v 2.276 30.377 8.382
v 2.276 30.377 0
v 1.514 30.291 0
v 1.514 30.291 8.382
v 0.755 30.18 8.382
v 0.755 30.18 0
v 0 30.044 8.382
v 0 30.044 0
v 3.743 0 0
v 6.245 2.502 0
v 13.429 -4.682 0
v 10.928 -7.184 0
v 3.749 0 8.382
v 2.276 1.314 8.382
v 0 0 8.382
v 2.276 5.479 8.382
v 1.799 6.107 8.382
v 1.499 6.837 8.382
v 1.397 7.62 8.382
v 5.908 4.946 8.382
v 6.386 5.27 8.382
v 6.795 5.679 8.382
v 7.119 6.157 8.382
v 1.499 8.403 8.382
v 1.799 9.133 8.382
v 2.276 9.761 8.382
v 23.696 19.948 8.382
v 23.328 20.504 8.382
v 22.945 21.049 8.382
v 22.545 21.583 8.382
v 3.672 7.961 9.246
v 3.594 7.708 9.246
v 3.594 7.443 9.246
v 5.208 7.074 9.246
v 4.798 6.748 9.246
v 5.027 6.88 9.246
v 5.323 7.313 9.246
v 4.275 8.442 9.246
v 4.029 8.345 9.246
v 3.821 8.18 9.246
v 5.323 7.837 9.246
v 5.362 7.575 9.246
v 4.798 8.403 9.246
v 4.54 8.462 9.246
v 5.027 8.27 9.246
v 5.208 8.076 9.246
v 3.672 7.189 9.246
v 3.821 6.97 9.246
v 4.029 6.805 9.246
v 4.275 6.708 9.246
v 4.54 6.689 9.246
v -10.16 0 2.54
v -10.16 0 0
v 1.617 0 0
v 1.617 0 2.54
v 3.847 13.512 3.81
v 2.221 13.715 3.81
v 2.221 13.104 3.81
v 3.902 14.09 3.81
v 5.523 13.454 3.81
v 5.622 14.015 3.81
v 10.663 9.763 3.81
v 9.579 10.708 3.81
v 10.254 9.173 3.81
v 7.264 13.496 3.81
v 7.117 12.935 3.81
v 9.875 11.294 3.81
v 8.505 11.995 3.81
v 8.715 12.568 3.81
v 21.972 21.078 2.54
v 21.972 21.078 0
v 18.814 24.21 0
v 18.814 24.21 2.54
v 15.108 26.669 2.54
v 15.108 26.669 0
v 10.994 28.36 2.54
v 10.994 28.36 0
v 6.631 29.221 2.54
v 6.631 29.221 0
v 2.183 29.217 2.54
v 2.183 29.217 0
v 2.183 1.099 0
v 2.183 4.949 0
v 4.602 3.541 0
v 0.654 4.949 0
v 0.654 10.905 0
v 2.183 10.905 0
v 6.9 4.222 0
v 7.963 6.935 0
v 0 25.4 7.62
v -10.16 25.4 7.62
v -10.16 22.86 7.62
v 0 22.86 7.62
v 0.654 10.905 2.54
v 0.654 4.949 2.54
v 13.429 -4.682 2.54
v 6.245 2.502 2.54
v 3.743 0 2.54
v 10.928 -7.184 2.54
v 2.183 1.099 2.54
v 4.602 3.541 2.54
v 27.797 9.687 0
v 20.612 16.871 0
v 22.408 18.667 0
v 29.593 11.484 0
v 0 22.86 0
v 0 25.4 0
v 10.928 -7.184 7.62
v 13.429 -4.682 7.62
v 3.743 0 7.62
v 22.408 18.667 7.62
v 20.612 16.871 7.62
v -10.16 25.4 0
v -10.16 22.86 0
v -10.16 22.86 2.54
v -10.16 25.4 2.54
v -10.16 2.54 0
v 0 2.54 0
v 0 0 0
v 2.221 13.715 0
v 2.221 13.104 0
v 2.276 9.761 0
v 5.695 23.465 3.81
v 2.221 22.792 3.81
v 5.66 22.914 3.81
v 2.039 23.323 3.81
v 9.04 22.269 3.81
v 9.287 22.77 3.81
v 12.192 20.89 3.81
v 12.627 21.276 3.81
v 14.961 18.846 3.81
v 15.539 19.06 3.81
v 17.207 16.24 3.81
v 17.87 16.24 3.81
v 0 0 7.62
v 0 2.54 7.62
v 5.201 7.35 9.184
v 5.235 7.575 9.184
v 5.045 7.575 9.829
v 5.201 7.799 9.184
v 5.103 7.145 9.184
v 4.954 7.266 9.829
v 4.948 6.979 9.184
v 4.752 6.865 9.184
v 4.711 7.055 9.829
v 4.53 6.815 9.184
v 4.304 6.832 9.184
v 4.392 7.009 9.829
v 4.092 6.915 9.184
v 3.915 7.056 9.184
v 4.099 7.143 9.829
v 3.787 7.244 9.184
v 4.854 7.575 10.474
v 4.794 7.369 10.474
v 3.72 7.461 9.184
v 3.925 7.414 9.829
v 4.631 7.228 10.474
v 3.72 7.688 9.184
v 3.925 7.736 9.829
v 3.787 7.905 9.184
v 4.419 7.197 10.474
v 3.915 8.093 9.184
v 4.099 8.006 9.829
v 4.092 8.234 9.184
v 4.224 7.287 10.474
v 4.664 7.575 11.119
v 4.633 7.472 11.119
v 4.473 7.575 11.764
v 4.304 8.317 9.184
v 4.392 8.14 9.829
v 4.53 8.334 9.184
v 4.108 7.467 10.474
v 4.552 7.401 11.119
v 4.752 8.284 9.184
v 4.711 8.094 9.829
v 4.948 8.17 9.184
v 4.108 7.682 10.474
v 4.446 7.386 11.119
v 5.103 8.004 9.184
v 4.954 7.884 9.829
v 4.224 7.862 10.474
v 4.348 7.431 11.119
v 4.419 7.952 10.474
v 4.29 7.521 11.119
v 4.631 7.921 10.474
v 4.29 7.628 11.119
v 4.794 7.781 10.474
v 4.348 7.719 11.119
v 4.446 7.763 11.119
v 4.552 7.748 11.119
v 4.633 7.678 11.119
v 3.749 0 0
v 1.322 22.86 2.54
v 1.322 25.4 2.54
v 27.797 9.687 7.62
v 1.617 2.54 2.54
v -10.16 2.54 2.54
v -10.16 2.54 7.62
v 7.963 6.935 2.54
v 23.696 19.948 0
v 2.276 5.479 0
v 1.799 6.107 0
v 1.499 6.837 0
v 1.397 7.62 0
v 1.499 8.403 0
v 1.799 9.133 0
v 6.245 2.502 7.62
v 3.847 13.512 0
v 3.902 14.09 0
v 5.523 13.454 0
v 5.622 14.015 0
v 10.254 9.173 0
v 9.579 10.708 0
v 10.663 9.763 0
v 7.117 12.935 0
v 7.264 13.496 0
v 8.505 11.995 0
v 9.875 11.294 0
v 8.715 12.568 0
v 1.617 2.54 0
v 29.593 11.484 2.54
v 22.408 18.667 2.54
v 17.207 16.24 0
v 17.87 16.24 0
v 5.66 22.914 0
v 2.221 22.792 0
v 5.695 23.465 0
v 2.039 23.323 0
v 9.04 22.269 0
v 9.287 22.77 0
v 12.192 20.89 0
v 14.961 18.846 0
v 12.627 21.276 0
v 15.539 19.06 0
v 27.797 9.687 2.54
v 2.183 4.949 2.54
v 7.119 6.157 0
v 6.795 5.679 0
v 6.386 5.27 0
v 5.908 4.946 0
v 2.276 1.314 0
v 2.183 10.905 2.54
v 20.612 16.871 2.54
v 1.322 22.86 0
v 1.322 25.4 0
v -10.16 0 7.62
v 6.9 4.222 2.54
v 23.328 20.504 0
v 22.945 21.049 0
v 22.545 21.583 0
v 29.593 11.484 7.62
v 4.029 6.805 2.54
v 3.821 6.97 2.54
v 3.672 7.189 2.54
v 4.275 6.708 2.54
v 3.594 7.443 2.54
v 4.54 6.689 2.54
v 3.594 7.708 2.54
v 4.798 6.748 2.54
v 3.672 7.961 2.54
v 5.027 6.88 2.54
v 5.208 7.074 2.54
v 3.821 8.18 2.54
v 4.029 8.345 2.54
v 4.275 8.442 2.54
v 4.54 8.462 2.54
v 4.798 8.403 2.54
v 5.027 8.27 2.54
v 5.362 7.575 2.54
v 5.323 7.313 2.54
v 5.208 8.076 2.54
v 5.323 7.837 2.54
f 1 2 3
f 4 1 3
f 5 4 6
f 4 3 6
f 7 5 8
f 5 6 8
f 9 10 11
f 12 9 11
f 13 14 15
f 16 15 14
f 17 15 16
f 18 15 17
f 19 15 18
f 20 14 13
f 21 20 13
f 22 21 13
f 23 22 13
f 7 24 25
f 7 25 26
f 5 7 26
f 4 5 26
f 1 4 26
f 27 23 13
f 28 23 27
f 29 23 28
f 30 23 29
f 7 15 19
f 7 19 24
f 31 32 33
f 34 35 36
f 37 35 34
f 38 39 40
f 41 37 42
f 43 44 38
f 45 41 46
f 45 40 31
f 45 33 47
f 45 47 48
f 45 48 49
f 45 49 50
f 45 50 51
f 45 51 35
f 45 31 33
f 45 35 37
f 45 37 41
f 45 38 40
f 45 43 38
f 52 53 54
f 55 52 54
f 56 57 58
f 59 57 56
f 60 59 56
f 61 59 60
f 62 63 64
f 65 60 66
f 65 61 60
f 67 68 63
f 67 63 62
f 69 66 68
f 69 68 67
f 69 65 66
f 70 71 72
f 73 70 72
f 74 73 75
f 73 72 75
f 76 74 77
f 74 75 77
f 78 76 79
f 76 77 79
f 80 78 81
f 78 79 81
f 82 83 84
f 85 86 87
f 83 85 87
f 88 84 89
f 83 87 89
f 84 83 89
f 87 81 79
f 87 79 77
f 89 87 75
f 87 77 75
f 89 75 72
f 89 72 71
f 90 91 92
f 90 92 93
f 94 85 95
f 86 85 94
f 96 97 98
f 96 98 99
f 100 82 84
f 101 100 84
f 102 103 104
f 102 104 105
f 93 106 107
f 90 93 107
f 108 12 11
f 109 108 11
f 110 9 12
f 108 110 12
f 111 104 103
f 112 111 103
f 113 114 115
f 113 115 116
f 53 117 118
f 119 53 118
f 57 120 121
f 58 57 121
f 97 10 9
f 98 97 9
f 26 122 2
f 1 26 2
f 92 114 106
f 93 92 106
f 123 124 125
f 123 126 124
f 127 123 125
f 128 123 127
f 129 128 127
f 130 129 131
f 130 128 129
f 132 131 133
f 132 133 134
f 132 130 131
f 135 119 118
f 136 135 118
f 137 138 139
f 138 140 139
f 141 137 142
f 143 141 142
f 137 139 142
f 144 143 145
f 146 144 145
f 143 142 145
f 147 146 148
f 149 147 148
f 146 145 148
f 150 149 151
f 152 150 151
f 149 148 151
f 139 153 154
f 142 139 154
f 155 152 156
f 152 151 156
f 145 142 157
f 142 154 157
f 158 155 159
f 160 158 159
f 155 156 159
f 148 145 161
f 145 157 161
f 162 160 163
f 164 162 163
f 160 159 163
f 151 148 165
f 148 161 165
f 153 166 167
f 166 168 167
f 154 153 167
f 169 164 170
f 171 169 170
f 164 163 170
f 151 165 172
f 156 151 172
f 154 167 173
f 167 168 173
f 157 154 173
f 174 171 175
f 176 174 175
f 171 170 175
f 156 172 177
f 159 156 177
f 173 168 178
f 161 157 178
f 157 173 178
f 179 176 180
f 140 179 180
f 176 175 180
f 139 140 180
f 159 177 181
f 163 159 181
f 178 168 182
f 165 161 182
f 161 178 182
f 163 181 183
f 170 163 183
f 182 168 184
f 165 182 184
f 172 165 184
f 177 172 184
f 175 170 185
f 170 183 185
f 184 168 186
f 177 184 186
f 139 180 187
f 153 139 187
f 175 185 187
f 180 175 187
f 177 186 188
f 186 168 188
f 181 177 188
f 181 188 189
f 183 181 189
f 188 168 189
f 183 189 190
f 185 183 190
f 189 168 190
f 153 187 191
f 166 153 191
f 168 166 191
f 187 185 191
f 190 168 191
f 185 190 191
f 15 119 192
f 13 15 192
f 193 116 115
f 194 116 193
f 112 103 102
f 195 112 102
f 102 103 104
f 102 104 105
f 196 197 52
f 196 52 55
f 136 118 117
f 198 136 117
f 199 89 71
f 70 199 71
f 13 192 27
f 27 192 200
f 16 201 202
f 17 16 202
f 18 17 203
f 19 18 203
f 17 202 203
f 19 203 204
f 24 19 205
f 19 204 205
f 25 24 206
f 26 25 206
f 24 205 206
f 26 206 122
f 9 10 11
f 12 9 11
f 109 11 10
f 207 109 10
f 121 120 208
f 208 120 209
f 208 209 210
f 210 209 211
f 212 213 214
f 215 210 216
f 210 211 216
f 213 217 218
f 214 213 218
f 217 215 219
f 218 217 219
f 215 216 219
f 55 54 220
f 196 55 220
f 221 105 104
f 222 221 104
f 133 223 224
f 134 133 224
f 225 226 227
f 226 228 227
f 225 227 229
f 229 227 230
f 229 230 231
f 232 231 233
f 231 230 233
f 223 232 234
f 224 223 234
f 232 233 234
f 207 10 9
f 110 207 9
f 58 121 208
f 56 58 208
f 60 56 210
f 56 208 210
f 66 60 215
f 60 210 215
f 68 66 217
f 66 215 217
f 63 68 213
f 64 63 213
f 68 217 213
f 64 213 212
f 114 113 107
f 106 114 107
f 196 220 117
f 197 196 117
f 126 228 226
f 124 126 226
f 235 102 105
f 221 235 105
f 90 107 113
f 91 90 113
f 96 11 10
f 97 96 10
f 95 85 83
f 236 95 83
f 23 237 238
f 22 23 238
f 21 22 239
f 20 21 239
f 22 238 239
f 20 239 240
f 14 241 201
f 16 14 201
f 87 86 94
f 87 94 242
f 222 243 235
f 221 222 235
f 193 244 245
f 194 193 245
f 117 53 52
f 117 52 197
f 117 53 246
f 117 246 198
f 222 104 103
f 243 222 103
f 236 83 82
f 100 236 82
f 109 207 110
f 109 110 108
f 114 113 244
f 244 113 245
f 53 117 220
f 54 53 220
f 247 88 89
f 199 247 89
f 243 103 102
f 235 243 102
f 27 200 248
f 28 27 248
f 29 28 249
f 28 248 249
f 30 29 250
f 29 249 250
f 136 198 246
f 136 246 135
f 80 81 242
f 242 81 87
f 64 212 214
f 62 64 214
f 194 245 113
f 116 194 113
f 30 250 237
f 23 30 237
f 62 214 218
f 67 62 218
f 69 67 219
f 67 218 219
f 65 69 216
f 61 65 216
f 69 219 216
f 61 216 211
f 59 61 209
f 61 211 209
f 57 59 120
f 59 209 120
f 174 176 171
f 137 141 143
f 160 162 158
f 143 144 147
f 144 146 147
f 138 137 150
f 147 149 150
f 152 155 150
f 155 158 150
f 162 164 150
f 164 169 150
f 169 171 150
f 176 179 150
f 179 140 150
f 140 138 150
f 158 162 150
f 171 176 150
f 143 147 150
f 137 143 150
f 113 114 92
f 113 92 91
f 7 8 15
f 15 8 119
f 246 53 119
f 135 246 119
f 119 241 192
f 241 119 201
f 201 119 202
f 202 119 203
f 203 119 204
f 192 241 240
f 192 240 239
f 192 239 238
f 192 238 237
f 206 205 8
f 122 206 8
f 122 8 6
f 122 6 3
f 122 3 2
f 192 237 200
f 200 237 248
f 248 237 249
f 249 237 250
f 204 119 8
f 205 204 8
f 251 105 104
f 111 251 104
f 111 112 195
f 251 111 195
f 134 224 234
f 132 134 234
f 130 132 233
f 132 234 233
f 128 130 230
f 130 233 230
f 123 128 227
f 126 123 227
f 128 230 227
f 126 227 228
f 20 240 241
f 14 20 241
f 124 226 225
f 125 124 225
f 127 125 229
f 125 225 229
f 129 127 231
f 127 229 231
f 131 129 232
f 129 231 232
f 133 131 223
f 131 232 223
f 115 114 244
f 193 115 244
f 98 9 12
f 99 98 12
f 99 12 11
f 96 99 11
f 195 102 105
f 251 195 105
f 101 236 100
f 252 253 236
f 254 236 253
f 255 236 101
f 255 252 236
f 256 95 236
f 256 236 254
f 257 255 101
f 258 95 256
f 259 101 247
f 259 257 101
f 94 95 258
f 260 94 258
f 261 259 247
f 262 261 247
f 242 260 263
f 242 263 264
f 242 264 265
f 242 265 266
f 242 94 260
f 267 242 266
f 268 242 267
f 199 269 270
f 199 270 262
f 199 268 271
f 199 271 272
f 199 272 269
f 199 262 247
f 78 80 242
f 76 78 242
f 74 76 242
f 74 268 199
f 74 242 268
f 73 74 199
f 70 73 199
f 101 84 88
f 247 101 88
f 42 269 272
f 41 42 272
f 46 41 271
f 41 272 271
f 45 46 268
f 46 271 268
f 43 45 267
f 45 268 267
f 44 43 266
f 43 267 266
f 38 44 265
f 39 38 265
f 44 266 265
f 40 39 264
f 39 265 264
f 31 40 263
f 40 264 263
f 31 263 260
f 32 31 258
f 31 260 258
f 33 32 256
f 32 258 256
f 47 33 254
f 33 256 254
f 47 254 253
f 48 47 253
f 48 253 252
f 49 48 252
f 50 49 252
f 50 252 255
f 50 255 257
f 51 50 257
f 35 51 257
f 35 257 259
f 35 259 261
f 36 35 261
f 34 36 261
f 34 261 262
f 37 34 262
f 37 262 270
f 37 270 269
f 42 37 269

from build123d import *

# Parameters (mm, degrees)
F1_DEPTH  = 8.382
F3_DEPTH  = 2.54
F2_W      = 8.050916653
F2_H      = 2.54
F2_W_2    = 1.6165730776
F2_W_3    = 2.109083347
F2_W_4    = 8.7637735362
F2_W_5    = 1.3216704829
F2_W_6    = 1.3962264638
F2_W_7    = 1.5293723554
F2_H_2    = 5.9558576904
F4_R      = 0.889
F5_DEPTH  = 9.2456
F7_DEPTH  = 3.81
F11_DEPTH = 7.62


with BuildPart() as f1:
    # F0 (on Top) → F1 (new body)
    with BuildSketch(Plane.XY):
        with BuildLine():
            Line((3.7485493437, 0), (23.6961988577, 19.947649514))
            ThreePointArc((23.6961988577, 19.947649514), (23.1385430874, 20.7779271482), (22.5451034559, 21.583017399))
            Line((22.5451034559, 21.583017399), (7.1187551725, 6.1566691156))
            ThreePointArc((7.1187551725, 6.1566691156), (6.6002614691, 5.4647385309), (5.9083308844, 4.9462448275))
            Line((5.9083308844, 4.9462448275), (2.2759593506, 1.3138732936))
            Line((2.2759593506, 1.3138732936), (2.2759593506, 0))
            Line((2.2759593506, 0), (3.7485493437, 0))
        make_face()
        with BuildLine():
            ThreePointArc((2.2759593506, 30.3768640779), (1.1337863589, 30.2389182814), (0, 30.0436833504))
            Line((0, 30.0436833504), (0, 0))
            Line((0, 0), (2.2759593506, 0))
            Line((2.2759593506, 0), (2.2759593506, 1.3138732936))
            Line((2.2759593506, 1.3138732936), (2.2759593506, 5.4786063741))
            ThreePointArc((2.2759593506, 5.4786063741), (1.397, 7.62), (2.2759593506, 9.7613936259))
            Line((2.2759593506, 9.7613936259), (2.2759593506, 30.3768640779))
        make_face()
    extrude(amount=F1_DEPTH)


with BuildPart() as f3:
    # F2 (on Top) → F3 (new body)
    with BuildSketch(Plane.XY):
        Polygon((6.2448288078, 2.5021023202), (3.7429869211, 0), (10.9275657147, -7.1838309806), (13.4294076014, -4.6817286604), align=None)
    extrude(amount=F3_DEPTH)


with BuildPart() as f3b:
    # F2 (on Top) → F3, piece 2 (new body)
    with BuildSketch(Plane.XY):
        Polygon((22.4084485141, 18.6674046059), (20.612490769, 16.8712599075), (27.7970695626, 9.6874289269), (29.5930273078, 11.4835736253), align=None)
    extrude(amount=F3_DEPTH)


with BuildPart() as f3c:
    # F2 (on Top) → F3, piece 3 (new body)
    with BuildSketch(Plane.XY):
        with Locations((-6.1345416735, 1.27)):
            Rectangle(F2_W, F2_H)
        with Locations((0.8082865388, 1.27)):
            Rectangle(F2_W_2, F2_H)
        with Locations((-1.0545416735, 1.27)):
            Rectangle(F2_W_3, F2_H)
    extrude(amount=F3_DEPTH)


with BuildPart() as f3d:
    # F2 (on Top) → F3, piece 4 (new body)
    with BuildSketch(Plane.XY):
        with Locations((-5.7781132319, 24.13)):
            Rectangle(F2_W_4, F2_H)
        with Locations((0.6608352414, 24.13)):
            Rectangle(F2_W_5, F2_H)
        with Locations((-0.6981132319, 24.13)):
            Rectangle(F2_W_6, F2_H)
    extrude(amount=F3_DEPTH)


with BuildPart() as f3e:
    # F2 (on Top) → F3, piece 5 (new body)
    with BuildSketch(Plane.XY):
        Polygon((6.899998989, 4.2223650962), (7.9633320999, 6.9349787761), (4.6019532938, 3.541349678), align=None)
        with Locations((1.4182971499, 7.9266179819)):
            Rectangle(F2_W_7, F2_H_2)
        with BuildLine():
            Line((7.9633320999, 6.9349787761), (21.9720159885, 21.0780670779))
            ThreePointArc((21.9720159885, 21.0780670779), (13.0924177111, 27.6152035166), (2.1829833277, 29.2169712334))
            Line((2.1829833277, 29.2169712334), (2.1829833277, 10.9045468271))
            Line((2.1829833277, 10.9045468271), (2.1829833277, 4.9486891367))
            Line((2.1829833277, 4.9486891367), (2.1829833277, 1.0991712334))
            Line((2.1829833277, 1.0991712334), (4.6019532938, 3.541349678))
            Line((4.6019532938, 3.541349678), (7.9633320999, 6.9349787761))
        make_face()
    extrude(amount=F3_DEPTH)

    # F4 (on Top) → F5 (join)
    with BuildSketch(Plane.XY):
        with Locations((4.4731078669, 7.5750704855)):
            Circle(F4_R)
    extrude(amount=F5_DEPTH)


with BuildPart() as f7:
    # F6 (on Top) → F7 (new body)
    with BuildSketch(Plane.XY):
        with BuildLine():
            Line((10.2542703971, 9.1733094305), (10.663289557, 9.7630766937))
            ThreePointArc((10.663289557, 9.7630766937), (7.2644825882, 13.4957673027), (2.2209716257, 13.7145483921))
            Line((2.2209716257, 13.7145483921), (2.2209716257, 13.1041229547))
            ThreePointArc((2.2209716257, 13.1041229547), (7.1166456012, 12.9351553046), (10.2542703971, 9.1733094305))
        make_face()
    extrude(amount=F7_DEPTH)


with BuildPart() as f7b:
    # F6 (on Top) → F7, piece 2 (new body)
    with BuildSketch(Plane.XY):
        with BuildLine():
            ThreePointArc((2.2209716257, 22.7923383599), (10.6547311493, 21.6677580329), (17.2066246046, 16.2395287853))
            Line((17.2066246046, 16.2395287853), (17.8702827543, 16.2395287853))
            ThreePointArc((17.8702827543, 16.2395287853), (11.0002918162, 22.1189332808), (2.0385167454, 23.3234083914))
            Line((2.0385167454, 23.3234083914), (2.2209716257, 22.7923383599))
        make_face()
    extrude(amount=F7_DEPTH)


with BuildPart() as f10:
    # F9 (on offset) → F10 (revolve)
    with BuildSketch(Plane.XZ.offset(-7.574534)):
        Polygon((4.4731178, 11.7640467361), (4.4731178, 10.1937586442), (4.4731178, 9.1838361695), (5.2351178, 9.1838361695), align=None)
    revolve(axis=Axis((4.4731178, 7.574534, 4.191), (0, 0, -1)))


with BuildPart() as f11:
    # F2 (on Top) → F11 (new body)
    with BuildSketch(Plane.XY):
        with Locations((-5.7781132319, 24.13)):
            Rectangle(F2_W_4, F2_H)
        with Locations((-0.6981132319, 24.13)):
            Rectangle(F2_W_6, F2_H)
    extrude(amount=F11_DEPTH)


with BuildPart() as f11b:
    # F2 (on Top) → F11, piece 2 (new body)
    with BuildSketch(Plane.XY):
        with Locations((-6.1345416735, 1.27)):
            Rectangle(F2_W, F2_H)
        with Locations((-1.0545416735, 1.27)):
            Rectangle(F2_W_3, F2_H)
    extrude(amount=F11_DEPTH)


with BuildPart() as f11c:
    # F2 (on Top) → F11, piece 3 (new body)
    with BuildSketch(Plane.XY):
        Polygon((6.2448288078, 2.5021023202), (3.7429869211, 0), (10.9275657147, -7.1838309806), (13.4294076014, -4.6817286604), align=None)
    extrude(amount=F11_DEPTH)


with BuildPart() as f11d:
    # F2 (on Top) → F11, piece 4 (new body)
    with BuildSketch(Plane.XY):
        Polygon((22.4084485141, 18.6674046059), (20.612490769, 16.8712599075), (27.7970695626, 9.6874289269), (29.5930273078, 11.4835736253), align=None)
    extrude(amount=F11_DEPTH)


solid = Compound([f1.part, f3.part, f3b.part, f3c.part, f3d.part, f3e.part, f7.part, f7b.part, f10.part, f11.part, f11b.part, f11c.part, f11d.part])
